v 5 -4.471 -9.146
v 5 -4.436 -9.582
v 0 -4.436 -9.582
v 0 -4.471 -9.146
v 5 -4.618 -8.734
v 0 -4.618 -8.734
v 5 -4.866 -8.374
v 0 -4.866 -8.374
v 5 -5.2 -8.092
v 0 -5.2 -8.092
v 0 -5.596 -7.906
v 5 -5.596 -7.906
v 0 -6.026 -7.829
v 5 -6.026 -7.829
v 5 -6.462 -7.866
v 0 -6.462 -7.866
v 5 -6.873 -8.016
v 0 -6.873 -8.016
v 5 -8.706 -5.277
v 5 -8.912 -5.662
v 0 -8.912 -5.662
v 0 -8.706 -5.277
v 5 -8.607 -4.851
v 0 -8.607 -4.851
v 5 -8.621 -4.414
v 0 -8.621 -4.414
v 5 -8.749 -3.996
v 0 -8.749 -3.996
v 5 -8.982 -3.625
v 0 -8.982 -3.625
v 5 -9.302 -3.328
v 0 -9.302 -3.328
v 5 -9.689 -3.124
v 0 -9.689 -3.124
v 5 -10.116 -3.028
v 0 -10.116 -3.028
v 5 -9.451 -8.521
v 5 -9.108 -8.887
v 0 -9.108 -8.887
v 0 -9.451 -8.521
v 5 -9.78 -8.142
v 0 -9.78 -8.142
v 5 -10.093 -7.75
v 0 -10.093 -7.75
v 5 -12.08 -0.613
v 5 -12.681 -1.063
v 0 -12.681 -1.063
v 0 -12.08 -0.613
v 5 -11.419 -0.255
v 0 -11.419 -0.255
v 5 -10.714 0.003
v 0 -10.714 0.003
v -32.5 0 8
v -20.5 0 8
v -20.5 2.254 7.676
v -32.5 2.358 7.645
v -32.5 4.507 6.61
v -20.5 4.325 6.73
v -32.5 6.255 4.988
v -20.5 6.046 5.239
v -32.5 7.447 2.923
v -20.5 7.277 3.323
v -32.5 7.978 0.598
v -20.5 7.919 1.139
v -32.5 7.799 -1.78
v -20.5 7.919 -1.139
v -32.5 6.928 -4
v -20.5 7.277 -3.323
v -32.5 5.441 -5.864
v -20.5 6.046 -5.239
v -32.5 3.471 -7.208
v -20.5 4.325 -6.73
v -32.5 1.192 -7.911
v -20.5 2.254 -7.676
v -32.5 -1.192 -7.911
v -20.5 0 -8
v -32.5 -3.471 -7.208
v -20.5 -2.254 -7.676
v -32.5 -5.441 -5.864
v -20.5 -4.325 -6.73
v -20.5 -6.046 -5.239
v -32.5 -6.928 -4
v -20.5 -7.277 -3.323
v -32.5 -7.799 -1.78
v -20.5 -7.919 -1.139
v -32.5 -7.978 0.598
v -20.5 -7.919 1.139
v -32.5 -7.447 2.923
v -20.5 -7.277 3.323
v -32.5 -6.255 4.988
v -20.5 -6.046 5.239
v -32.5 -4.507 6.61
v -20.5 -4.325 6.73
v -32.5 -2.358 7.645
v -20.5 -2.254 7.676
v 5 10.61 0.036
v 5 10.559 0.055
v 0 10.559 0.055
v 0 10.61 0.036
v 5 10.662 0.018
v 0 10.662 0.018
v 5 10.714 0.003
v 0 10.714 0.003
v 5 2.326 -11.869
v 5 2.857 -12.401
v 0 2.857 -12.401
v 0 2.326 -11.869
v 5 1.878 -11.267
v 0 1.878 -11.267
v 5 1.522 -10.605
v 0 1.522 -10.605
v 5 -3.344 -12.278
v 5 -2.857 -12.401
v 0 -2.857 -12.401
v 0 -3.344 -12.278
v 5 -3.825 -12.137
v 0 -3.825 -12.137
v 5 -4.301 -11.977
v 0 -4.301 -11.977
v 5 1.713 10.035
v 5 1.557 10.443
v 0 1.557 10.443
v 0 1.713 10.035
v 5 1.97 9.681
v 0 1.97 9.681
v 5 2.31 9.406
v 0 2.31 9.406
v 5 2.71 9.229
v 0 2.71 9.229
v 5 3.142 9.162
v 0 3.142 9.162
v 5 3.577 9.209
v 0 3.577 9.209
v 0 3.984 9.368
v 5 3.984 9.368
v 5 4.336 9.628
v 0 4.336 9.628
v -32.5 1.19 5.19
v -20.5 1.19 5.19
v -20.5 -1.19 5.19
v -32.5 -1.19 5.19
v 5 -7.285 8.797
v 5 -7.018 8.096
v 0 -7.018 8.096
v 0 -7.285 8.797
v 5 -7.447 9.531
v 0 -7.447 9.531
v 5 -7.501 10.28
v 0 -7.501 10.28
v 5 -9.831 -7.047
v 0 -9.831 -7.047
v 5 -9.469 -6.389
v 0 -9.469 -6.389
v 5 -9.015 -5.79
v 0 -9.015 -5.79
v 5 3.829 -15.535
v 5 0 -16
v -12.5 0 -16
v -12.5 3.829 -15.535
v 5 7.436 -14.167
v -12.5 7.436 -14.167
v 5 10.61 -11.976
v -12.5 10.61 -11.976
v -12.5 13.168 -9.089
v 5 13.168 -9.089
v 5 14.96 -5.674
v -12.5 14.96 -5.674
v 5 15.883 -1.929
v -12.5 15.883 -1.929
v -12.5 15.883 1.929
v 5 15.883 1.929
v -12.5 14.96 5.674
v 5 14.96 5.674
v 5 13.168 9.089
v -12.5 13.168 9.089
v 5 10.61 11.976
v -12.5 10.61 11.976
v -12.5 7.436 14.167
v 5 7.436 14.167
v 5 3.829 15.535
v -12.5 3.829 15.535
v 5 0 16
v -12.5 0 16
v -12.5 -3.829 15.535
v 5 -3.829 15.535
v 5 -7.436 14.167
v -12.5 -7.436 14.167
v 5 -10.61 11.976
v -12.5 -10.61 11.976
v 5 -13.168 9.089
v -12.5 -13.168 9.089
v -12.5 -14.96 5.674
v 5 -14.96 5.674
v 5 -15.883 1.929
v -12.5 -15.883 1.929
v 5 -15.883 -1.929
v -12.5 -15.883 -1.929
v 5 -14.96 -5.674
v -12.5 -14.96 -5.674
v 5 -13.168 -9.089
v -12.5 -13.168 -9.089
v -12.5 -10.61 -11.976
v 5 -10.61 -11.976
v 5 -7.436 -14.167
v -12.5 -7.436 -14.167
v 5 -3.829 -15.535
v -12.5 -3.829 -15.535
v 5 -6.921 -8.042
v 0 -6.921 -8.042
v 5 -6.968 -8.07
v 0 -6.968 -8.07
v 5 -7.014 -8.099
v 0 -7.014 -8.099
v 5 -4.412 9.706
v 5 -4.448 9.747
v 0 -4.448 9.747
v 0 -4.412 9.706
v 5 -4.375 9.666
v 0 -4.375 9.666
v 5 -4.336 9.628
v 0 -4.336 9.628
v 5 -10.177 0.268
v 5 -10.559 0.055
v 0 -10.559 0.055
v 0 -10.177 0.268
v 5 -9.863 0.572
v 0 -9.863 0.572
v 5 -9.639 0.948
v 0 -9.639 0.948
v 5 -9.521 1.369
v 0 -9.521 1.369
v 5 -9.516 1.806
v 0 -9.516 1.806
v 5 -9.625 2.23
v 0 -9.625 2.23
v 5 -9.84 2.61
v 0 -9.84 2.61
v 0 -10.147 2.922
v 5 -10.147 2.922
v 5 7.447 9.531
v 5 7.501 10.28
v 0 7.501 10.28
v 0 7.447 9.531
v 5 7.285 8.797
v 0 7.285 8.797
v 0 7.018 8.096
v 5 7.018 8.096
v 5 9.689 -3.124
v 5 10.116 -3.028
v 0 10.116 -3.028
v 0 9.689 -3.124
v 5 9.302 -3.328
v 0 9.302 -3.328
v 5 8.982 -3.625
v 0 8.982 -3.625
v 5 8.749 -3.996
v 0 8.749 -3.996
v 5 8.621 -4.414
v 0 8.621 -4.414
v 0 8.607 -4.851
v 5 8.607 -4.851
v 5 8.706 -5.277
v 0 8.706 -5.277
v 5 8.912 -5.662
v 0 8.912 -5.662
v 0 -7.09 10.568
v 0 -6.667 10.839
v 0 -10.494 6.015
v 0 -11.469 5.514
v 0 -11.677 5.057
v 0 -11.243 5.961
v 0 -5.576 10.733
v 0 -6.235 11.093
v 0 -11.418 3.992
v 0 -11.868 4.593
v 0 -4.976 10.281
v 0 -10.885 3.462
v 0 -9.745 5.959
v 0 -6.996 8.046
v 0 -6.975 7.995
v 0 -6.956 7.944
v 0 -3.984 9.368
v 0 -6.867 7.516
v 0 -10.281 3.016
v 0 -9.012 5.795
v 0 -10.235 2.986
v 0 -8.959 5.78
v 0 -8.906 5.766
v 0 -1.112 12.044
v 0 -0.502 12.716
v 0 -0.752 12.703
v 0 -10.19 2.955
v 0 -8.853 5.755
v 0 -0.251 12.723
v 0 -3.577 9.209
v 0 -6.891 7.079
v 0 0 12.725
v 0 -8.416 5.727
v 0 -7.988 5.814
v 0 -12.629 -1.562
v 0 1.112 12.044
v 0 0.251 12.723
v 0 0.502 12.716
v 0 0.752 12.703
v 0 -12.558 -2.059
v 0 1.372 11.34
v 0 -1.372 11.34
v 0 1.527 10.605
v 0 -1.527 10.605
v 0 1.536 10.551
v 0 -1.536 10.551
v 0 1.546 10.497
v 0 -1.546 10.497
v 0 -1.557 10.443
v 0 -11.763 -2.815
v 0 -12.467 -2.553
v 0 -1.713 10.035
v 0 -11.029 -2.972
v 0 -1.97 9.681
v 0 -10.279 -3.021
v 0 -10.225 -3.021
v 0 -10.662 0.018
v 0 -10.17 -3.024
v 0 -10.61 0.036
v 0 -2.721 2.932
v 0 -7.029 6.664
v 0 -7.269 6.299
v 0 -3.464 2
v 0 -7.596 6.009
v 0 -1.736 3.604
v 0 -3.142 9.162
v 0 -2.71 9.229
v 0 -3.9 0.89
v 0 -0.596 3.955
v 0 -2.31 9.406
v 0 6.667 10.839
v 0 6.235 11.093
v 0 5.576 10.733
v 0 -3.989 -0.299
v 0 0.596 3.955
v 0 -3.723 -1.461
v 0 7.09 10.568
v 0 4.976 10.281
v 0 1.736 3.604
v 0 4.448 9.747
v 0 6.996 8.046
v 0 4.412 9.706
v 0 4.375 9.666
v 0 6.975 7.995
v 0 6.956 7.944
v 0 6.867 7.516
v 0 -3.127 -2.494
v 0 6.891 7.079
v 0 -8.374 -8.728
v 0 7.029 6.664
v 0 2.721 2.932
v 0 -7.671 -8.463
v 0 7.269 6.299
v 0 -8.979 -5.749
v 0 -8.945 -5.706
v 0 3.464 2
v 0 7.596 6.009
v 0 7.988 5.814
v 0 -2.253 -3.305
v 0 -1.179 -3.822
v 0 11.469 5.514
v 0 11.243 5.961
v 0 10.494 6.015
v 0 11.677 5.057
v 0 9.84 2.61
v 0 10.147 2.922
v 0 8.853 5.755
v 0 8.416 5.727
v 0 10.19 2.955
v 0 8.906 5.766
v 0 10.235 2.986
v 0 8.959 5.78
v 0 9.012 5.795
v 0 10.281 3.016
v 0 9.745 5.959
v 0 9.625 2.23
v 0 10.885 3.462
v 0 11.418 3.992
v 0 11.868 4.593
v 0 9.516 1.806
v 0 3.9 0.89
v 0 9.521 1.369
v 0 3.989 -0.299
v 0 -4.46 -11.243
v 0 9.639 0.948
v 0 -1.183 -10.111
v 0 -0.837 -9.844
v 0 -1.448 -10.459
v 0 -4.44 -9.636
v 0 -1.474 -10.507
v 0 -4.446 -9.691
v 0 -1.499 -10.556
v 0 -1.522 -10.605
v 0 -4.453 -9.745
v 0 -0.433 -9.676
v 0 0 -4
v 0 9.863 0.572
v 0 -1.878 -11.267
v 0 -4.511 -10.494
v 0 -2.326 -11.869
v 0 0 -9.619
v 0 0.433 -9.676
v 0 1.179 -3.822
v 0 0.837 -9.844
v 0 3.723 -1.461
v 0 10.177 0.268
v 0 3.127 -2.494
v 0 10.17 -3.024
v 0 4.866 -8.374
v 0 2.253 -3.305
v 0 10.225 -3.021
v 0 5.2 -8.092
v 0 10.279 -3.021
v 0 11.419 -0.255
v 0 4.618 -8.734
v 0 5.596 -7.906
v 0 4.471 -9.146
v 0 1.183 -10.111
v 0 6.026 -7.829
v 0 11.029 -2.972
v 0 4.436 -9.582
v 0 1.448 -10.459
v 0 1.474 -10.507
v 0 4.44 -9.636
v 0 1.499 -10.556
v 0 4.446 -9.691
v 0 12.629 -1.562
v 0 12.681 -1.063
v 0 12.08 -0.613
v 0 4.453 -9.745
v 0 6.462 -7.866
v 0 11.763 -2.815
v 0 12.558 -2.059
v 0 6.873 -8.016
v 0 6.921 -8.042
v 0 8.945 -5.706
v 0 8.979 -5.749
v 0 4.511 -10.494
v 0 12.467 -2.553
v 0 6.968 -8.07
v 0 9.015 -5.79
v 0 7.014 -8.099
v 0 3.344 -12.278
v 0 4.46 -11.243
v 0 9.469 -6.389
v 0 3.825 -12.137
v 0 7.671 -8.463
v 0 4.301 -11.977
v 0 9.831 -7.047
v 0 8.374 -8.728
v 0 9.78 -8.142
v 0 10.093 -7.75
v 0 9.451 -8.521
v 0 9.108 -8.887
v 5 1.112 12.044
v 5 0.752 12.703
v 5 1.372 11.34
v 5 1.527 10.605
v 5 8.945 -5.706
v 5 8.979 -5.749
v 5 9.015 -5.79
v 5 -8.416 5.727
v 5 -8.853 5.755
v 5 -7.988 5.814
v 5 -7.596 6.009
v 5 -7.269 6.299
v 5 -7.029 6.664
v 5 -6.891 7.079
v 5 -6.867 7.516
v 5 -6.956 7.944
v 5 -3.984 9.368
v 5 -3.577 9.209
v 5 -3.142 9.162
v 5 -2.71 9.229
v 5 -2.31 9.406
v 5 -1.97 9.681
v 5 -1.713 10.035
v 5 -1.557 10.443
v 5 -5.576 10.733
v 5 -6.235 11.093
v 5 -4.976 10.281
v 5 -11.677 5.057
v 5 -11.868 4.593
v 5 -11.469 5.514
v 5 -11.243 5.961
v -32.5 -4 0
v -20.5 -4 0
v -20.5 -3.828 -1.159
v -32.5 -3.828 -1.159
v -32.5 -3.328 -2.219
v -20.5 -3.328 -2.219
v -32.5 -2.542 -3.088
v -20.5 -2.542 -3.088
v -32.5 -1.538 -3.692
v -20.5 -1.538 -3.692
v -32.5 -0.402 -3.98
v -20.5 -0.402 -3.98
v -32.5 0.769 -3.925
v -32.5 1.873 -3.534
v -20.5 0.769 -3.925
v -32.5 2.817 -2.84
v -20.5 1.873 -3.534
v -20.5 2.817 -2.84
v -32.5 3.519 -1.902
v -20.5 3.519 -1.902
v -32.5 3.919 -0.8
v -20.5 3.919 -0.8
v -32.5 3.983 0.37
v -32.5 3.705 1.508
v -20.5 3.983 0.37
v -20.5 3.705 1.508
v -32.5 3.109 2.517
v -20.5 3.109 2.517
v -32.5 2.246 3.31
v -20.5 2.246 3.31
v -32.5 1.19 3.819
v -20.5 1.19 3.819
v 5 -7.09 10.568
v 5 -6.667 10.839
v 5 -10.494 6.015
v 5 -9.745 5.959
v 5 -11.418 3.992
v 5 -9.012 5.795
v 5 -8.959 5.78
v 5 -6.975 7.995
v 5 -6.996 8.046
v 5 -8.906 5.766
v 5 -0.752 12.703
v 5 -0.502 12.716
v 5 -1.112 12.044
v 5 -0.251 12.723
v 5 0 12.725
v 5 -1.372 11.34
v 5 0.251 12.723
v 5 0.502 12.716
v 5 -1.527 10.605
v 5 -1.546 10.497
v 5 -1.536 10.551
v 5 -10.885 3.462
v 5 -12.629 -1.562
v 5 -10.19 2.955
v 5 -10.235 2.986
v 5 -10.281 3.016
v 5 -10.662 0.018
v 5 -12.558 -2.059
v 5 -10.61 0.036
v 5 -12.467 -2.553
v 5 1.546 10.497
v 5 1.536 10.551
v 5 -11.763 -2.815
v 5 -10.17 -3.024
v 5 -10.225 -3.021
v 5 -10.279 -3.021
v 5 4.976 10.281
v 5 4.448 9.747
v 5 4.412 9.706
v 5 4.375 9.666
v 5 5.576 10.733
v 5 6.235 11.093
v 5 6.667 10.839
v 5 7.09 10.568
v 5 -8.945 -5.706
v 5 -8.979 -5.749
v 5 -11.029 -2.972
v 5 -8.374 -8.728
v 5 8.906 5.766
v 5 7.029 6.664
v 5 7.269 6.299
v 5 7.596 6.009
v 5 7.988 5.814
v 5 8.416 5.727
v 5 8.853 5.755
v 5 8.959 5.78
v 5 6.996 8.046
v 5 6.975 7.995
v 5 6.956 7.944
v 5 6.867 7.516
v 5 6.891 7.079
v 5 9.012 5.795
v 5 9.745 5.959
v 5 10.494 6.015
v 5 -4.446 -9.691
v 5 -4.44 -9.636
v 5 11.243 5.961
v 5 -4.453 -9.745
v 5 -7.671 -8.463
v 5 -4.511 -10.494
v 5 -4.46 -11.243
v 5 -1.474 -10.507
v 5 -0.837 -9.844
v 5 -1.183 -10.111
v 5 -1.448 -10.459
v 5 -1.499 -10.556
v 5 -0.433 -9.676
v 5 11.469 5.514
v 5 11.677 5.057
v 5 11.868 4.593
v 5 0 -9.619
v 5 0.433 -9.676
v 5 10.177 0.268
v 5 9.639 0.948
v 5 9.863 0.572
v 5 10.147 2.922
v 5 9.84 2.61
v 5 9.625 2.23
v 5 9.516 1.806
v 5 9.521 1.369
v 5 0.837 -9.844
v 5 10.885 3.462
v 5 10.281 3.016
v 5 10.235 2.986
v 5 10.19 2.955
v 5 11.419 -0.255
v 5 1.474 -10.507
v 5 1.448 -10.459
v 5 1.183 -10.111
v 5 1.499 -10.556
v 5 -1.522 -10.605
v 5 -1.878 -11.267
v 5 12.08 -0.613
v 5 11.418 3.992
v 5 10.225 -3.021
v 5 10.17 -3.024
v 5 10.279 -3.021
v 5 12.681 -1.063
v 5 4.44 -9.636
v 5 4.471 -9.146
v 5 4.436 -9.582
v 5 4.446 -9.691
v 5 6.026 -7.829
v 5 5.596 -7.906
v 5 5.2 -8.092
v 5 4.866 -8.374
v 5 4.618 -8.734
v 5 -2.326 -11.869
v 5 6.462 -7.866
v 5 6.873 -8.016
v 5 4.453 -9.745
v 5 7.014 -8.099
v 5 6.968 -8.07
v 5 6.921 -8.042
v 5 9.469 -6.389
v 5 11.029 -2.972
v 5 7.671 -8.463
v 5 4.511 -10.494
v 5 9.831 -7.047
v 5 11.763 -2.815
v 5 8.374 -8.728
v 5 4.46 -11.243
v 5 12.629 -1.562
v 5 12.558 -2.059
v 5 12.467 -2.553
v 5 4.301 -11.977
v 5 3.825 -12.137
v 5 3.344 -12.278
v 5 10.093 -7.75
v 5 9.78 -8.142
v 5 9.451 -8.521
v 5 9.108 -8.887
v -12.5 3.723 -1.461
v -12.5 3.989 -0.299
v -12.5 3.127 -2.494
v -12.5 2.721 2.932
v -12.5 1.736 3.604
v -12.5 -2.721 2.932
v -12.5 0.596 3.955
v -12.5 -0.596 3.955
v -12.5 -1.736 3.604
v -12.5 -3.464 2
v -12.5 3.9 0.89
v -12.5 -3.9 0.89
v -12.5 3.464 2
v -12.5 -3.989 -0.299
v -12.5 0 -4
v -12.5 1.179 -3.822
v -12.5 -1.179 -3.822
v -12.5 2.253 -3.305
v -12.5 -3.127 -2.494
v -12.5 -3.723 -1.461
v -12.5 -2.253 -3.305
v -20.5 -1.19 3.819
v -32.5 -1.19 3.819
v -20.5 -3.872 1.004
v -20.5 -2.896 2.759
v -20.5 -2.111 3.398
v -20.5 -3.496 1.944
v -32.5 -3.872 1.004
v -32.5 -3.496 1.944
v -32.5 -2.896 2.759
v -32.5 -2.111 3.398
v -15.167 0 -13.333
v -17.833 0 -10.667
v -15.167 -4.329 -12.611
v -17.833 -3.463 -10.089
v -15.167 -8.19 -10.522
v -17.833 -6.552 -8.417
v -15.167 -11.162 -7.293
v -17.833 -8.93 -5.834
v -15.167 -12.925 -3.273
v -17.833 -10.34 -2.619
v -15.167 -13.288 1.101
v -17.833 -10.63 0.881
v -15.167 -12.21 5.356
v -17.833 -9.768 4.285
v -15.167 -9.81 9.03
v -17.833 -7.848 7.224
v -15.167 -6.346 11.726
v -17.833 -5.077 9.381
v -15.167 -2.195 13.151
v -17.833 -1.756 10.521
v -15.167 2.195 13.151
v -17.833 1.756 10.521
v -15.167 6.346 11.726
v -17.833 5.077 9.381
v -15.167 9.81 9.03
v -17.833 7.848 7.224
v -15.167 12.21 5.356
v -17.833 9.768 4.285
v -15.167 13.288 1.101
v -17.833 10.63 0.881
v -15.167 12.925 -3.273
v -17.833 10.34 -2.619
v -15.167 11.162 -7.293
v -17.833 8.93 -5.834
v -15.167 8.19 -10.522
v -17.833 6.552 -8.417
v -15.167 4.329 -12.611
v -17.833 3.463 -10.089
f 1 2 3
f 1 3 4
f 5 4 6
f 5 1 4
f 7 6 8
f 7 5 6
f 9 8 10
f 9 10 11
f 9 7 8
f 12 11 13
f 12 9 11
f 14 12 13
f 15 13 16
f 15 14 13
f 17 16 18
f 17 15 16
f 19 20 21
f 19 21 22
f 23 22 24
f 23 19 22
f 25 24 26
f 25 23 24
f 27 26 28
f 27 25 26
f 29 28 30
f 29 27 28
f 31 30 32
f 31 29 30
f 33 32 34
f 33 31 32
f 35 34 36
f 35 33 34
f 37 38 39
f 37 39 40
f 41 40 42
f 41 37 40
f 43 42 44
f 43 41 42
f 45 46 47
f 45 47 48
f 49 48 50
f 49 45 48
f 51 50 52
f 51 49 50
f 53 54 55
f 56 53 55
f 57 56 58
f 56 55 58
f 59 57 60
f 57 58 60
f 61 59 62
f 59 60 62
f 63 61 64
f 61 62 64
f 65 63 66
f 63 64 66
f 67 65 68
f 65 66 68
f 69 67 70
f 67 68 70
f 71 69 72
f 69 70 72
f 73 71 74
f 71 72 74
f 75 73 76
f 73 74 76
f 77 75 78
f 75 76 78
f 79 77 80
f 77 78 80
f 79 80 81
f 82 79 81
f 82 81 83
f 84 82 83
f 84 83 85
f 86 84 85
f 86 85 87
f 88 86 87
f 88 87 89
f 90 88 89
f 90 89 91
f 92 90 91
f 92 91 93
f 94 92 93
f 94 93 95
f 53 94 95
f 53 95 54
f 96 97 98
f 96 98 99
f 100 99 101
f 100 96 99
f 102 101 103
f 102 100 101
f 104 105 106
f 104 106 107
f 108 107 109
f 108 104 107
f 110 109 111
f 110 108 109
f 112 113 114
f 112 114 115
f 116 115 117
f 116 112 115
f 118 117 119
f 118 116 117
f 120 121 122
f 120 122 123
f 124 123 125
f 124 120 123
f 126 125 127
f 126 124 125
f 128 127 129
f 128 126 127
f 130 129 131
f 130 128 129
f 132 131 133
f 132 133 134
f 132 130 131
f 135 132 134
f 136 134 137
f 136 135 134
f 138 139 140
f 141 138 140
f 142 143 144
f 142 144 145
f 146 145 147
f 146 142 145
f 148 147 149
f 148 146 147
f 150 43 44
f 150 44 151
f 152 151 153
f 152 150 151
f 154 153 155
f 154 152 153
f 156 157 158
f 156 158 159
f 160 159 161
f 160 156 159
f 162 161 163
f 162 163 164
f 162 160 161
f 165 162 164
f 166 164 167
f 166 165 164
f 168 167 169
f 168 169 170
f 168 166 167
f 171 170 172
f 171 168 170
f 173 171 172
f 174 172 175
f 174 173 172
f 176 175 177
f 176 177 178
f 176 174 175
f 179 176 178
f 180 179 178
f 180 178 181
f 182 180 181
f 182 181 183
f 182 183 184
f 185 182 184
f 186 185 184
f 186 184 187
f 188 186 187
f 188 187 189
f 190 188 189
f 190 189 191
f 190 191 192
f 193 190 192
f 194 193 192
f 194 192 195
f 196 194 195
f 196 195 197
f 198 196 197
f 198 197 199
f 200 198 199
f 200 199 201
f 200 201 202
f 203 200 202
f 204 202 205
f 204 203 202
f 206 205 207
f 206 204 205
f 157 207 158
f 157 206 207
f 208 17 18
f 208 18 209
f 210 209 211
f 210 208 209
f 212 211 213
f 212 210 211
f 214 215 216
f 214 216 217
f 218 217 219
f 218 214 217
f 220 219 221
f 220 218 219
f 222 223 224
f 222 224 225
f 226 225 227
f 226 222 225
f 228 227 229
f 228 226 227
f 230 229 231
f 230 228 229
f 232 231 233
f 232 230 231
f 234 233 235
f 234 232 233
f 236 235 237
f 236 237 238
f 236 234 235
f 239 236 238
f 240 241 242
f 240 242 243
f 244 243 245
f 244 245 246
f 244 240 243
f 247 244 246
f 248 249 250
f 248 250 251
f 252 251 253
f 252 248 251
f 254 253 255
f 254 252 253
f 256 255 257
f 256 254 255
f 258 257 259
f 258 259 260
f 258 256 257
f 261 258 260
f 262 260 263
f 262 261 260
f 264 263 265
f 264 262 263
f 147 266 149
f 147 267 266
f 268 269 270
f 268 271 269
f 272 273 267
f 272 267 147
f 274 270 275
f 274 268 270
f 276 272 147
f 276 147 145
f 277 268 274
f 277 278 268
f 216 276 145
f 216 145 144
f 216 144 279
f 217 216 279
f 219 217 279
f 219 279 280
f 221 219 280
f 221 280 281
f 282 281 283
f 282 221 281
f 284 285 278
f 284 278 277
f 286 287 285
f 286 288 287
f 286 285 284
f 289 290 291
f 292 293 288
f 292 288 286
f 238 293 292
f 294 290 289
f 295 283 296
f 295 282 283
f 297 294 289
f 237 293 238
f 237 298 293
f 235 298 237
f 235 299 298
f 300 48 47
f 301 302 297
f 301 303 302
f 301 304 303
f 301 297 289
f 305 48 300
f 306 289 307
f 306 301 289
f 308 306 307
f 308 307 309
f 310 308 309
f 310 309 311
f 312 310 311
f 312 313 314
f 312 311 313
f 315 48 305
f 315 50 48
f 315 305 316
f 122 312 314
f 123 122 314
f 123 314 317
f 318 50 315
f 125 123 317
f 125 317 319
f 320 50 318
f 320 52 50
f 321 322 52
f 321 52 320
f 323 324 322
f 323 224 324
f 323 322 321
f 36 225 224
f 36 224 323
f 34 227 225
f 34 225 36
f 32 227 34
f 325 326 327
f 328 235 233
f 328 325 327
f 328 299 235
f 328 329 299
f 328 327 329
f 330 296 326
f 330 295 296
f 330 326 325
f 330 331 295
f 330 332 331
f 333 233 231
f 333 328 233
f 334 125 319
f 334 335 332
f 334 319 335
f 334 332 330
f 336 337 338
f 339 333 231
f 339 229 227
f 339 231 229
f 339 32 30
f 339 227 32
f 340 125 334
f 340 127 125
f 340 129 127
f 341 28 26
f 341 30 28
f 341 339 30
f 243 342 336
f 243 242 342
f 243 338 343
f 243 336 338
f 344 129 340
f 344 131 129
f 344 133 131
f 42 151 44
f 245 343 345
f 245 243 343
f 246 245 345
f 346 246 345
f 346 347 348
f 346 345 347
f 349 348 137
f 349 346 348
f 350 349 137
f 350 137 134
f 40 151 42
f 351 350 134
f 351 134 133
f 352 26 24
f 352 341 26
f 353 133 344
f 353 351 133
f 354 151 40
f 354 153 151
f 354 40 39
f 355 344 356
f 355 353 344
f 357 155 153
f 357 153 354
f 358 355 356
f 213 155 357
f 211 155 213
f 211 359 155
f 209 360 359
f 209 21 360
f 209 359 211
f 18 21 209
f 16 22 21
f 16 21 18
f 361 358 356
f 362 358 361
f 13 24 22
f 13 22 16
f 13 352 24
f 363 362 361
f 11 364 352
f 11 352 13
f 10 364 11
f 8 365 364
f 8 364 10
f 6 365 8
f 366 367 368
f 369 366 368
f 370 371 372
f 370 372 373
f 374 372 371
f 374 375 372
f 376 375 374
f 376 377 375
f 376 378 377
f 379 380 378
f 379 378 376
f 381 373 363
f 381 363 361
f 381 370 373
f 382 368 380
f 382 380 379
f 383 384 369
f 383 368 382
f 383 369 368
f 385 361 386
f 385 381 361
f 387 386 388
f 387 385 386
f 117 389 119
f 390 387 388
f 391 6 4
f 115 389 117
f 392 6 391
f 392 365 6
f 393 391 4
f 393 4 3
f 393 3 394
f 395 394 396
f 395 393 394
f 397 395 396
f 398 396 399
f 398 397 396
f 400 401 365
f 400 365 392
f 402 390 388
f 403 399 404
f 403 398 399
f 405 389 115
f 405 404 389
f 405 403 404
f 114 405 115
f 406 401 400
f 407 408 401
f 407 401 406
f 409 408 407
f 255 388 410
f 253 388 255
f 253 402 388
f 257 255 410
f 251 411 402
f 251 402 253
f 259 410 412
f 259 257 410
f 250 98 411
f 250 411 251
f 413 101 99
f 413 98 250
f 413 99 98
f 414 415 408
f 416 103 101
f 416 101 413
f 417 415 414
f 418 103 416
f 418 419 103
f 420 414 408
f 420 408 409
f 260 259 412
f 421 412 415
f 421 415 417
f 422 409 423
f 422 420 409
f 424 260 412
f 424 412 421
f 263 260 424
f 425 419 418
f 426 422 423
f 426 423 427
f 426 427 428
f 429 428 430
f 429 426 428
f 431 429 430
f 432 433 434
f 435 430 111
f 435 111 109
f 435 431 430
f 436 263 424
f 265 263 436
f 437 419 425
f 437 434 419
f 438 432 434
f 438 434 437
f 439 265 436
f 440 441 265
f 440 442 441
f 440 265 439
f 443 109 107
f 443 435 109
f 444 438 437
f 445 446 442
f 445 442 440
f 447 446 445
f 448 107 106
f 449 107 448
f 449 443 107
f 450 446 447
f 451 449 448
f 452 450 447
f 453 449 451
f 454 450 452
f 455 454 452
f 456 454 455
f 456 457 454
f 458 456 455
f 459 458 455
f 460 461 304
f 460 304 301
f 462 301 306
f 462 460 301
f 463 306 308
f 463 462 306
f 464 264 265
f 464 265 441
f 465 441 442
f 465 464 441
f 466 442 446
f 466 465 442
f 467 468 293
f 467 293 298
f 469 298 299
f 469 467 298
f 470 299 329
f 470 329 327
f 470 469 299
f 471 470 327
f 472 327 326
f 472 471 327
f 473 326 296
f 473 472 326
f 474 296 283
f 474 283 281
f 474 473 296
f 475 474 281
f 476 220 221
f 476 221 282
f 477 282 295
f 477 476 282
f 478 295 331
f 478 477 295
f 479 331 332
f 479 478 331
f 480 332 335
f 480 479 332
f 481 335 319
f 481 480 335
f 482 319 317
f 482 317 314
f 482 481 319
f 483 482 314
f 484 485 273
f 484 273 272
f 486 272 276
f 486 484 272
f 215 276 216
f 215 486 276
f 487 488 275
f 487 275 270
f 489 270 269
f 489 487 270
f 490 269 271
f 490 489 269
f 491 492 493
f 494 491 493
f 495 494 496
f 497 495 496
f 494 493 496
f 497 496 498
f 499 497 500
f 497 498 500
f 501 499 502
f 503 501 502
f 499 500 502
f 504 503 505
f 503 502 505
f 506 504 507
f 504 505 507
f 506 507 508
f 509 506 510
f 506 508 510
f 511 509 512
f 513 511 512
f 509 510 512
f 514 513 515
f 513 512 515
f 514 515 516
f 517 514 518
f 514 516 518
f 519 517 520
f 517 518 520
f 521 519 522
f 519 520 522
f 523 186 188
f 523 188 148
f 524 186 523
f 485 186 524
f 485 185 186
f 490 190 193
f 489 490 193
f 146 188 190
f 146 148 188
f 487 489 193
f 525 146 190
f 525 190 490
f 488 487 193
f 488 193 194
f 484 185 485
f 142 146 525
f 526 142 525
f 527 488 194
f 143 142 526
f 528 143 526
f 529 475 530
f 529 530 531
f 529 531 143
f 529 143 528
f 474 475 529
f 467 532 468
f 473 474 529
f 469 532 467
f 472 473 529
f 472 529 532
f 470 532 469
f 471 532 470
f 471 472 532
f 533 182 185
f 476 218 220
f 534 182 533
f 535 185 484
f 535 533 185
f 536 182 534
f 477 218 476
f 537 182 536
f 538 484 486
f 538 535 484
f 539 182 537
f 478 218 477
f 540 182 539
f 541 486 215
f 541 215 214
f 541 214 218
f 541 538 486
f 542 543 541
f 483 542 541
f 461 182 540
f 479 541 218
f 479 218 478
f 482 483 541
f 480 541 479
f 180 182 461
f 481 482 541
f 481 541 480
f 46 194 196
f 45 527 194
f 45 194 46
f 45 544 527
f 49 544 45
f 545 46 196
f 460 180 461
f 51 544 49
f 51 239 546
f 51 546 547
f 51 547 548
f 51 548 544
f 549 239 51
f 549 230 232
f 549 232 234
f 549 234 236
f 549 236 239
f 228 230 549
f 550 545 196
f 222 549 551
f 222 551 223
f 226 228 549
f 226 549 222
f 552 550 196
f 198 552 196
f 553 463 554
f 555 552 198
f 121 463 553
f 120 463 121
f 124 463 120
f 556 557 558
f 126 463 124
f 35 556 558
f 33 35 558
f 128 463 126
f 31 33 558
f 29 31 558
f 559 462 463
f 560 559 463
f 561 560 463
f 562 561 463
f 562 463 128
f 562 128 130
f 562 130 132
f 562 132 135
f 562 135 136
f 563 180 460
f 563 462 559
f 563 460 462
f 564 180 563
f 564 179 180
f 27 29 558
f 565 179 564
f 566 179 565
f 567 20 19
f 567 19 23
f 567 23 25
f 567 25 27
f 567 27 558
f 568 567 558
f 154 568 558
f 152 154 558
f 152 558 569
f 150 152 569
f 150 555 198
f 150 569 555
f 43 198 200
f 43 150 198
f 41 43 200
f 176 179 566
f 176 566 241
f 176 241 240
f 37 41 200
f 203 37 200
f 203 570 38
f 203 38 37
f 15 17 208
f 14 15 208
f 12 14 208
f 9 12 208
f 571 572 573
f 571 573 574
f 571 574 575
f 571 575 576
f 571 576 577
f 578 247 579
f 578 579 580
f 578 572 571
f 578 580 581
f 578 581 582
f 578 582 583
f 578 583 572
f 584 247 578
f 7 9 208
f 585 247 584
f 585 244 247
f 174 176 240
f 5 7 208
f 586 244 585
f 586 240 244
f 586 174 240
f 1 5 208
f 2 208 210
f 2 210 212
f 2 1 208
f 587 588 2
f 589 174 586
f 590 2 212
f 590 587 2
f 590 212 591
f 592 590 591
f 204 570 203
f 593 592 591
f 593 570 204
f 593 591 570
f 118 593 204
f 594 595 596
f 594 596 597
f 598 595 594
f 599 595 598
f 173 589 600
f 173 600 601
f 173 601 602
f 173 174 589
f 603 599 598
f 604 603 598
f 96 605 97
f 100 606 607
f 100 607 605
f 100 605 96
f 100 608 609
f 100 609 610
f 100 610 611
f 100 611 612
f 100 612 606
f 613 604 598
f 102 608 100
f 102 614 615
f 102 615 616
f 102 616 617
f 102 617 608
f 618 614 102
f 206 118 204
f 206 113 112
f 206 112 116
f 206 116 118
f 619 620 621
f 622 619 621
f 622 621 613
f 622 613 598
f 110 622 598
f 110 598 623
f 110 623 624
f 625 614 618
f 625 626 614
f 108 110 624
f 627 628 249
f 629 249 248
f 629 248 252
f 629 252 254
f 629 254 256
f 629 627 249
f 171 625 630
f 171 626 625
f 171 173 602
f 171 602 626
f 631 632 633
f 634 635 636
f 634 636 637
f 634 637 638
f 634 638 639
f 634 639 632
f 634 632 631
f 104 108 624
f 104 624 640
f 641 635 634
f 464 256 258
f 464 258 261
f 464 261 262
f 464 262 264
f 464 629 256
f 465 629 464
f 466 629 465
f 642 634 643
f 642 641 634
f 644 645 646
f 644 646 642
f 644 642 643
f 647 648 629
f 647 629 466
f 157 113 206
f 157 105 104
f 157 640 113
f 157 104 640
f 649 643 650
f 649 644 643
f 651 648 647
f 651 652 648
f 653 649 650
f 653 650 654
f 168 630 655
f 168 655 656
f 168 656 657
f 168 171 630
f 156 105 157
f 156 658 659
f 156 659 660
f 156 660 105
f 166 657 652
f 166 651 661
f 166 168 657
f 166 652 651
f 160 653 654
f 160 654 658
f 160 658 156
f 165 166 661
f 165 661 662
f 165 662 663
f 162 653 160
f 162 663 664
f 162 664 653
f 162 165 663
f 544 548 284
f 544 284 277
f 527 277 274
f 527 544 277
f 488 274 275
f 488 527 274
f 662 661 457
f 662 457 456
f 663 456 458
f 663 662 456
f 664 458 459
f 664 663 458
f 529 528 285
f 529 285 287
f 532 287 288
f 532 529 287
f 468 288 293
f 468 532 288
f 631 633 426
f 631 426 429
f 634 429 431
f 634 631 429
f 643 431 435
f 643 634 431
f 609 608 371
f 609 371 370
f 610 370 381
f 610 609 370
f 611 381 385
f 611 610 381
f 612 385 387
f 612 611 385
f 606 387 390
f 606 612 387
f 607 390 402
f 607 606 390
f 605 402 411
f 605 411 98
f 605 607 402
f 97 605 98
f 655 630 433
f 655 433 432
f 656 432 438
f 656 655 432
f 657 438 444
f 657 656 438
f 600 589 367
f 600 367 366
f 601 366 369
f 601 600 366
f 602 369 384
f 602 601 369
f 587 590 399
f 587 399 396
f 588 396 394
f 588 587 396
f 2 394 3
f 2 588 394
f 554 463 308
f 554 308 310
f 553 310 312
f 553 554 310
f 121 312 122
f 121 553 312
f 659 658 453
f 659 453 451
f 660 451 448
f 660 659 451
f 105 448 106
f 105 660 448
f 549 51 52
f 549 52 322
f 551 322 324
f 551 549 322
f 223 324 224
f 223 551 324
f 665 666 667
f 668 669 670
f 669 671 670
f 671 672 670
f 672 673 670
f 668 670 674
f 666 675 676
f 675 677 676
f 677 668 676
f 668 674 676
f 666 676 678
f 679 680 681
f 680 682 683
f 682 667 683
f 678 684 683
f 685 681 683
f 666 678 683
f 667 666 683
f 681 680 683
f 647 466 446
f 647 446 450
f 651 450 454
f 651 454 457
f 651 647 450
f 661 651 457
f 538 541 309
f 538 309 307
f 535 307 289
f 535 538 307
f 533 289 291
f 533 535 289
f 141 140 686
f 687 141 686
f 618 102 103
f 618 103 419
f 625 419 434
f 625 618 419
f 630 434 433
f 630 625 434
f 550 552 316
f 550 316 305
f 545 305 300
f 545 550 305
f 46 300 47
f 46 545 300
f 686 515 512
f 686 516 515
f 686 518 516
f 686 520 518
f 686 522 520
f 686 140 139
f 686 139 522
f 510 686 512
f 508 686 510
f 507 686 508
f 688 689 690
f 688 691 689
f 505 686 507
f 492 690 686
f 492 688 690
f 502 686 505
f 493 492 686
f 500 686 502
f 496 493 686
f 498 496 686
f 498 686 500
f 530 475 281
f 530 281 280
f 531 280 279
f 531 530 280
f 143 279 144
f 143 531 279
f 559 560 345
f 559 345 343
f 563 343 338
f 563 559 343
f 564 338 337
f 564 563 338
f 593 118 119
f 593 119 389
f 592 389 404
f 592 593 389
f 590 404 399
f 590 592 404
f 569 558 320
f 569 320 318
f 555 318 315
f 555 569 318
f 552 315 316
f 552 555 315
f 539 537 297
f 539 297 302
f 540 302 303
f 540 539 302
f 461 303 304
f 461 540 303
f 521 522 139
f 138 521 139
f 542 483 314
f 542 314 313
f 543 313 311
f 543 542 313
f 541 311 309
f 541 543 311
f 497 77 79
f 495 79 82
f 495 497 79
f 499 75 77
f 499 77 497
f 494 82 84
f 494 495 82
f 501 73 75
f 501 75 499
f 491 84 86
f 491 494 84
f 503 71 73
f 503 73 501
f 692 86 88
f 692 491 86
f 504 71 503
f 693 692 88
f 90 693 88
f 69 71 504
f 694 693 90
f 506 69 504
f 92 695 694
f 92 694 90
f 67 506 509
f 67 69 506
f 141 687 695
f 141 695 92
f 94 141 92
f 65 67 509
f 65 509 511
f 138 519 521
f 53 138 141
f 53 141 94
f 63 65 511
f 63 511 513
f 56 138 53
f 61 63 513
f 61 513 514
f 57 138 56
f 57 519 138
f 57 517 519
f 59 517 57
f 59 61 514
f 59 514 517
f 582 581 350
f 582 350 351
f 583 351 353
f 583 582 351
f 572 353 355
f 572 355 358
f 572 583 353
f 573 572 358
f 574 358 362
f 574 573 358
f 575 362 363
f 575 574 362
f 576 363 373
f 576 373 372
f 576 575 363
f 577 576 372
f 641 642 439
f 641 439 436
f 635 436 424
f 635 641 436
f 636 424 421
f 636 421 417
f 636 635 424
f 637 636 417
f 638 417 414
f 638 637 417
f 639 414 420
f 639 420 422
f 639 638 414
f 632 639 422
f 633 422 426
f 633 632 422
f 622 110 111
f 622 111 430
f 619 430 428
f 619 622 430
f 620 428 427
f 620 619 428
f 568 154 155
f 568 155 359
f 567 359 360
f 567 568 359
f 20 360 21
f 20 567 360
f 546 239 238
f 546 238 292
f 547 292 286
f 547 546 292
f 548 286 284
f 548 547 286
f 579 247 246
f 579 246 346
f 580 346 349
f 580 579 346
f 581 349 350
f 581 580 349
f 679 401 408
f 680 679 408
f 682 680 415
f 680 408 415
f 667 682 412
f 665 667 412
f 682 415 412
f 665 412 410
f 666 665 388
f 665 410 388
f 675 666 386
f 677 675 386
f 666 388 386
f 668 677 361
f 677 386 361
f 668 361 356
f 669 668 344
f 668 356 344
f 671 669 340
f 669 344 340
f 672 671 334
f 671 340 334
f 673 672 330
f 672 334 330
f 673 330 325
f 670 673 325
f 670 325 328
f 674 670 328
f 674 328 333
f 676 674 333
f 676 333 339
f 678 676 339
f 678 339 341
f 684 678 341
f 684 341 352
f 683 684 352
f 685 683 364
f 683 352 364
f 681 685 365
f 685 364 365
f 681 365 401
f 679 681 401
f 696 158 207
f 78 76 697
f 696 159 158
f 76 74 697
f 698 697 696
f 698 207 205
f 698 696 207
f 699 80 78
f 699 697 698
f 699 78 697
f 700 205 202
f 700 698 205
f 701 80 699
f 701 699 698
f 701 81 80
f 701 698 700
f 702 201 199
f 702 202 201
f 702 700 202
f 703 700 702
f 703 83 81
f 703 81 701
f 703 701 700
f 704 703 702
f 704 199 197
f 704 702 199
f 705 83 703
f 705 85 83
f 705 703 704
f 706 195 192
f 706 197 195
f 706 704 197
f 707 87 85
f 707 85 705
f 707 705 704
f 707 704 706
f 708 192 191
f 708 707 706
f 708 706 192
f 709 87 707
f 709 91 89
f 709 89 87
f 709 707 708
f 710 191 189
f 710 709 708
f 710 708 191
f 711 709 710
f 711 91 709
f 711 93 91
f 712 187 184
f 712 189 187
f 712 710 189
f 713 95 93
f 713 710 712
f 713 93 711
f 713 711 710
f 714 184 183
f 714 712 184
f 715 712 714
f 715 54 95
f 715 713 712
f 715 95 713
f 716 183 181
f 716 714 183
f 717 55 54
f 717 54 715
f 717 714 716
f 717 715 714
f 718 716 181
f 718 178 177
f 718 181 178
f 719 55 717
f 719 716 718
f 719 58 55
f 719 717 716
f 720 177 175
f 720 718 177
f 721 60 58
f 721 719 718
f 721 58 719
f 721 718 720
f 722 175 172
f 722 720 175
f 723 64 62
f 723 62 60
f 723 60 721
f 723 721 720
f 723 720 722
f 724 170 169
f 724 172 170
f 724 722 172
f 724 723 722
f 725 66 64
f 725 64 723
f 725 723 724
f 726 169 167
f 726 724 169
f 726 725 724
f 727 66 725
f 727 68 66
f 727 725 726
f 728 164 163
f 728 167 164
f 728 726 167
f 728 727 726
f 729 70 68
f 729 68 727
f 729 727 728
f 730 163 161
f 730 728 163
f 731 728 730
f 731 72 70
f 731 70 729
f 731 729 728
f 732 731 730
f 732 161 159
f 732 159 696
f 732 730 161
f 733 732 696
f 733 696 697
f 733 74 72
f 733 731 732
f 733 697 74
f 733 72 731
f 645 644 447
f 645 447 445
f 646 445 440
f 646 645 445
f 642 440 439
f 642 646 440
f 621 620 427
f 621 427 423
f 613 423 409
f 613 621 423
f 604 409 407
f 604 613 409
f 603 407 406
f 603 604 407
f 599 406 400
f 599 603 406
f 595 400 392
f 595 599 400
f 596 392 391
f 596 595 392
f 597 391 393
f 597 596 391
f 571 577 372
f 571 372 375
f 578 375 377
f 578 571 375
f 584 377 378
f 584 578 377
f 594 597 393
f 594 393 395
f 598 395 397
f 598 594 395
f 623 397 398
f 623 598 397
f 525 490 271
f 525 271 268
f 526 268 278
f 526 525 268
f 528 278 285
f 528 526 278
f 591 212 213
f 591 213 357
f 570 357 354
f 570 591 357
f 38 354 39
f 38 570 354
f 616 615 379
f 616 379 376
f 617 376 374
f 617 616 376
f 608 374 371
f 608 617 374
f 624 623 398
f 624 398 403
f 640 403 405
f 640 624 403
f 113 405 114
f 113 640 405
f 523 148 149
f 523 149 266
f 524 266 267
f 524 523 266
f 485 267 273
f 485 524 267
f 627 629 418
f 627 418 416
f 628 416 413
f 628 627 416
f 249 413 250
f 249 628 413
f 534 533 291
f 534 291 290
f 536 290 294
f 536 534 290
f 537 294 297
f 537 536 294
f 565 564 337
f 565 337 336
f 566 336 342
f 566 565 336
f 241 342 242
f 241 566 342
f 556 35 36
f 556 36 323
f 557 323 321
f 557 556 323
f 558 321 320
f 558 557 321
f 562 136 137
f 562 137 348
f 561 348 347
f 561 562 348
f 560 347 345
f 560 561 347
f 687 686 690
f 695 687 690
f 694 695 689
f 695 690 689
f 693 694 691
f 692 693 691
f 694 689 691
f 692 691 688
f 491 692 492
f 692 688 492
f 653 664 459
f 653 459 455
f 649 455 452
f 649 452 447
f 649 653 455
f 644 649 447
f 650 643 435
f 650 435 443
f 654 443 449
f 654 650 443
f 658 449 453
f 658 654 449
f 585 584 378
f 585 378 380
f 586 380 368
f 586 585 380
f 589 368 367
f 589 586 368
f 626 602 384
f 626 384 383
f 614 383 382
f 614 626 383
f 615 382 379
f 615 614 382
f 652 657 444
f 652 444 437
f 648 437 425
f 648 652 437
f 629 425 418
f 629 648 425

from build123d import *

# Parameters (mm, degrees)
SKETCH1_R           = 16
SKETCH1_R_2         = 4
BOSS_EXTRUDE1_DEPTH = 12.5
BOSS_EXTRUDE2_START = 5
SKETCH1_3_R         = 16
BOSS_EXTRUDE2_DEPTH = 5
SKETCH2_R           = 16
BOSS_EXTRUDE3_DEPTH = 8
BOSS_EXTRUDE3_TAPER = 45
SKETCH4_R           = 8
BOSS_EXTRUDE4_DEPTH = 12


with BuildPart() as part:
    # Sketch1 → Boss-Extrude1 (new body)
    with BuildSketch(Plane.YZ):
        Circle(SKETCH1_R)
        Circle(SKETCH1_R_2, mode=Mode.SUBTRACT)
    extrude(amount=-BOSS_EXTRUDE1_DEPTH)

    # Sketch1<3> → Boss-Extrude2 (add)
    with BuildSketch(Plane.YZ.offset(BOSS_EXTRUDE2_START)):
        Circle(SKETCH1_3_R)
        with BuildLine():
            ThreePointArc((-4.453103796, -9.74483847), (-4.442785625, -9.66347175), (-4.436480838, -9.581696098))
            ThreePointArc((-4.436480838, -9.581696098), (-5.200182393, -8.091641748), (-6.872836595, -8.015945326))
            ThreePointArc((-6.872836595, -8.015945326), (-6.944603241, -8.055651196), (-7.014330689, -8.098837891))
            ThreePointArc((-7.014330689, -8.098837891), (-8.017688064, -8.608122706), (-9.107689918, -8.887394979))
            ThreePointArc((-9.107689918, -8.887394979), (-9.617215633, -8.333364784), (-10.093093531, -7.750178588))
            ThreePointArc((-10.093093531, -7.750178588), (-9.661540409, -6.711015969), (-9.014646736, -5.790350112))
            ThreePointArc((-9.014646736, -5.790350112), (-8.961976369, -5.727478496), (-8.912461189, -5.662093066))
            ThreePointArc((-8.912461189, -5.662093066), (-8.749343619, -3.995691347), (-10.1155453, -3.027706329))
            ThreePointArc((-10.1155453, -3.027706329), (-10.197385858, -3.022309054), (-10.27939281, -3.02094251))
            ThreePointArc((-10.27939281, -3.02094251), (-11.398810905, -2.906924208), (-12.466764806, -2.552563501))
            ThreePointArc((-12.466764806, -2.552563501), (-12.595873777, -1.811013243), (-12.680913477, -1.06312678))
            ThreePointArc((-12.680913477, -1.06312678), (-11.756054161, -0.422242789), (-10.714103032, 0.002533493))
            ThreePointArc((-10.714103032, 0.002533493), (-10.635802938, 0.026948711), (-10.558798085, 0.055184508))
            ThreePointArc((-10.558798085, 0.055184508), (-9.520650065, 1.368862824), (-10.146639845, 2.921808034))
            ThreePointArc((-10.146639845, 2.921808034), (-10.212570517, 2.970594857), (-10.280820345, 3.016080773))
            ThreePointArc((-10.280820345, 3.016080773), (-11.160891825, 3.717202186), (-11.867729954, 4.592688853))
            ThreePointArc((-11.867729954, 4.592688853), (-11.575430994, 5.286322206), (-11.242632993, 5.961460269))
            ThreePointArc((-11.242632993, 5.961460269), (-10.118103781, 6.000589494), (-9.011907317, 5.794612731))
            ThreePointArc((-9.011907317, 5.794612731), (-8.932837223, 5.772819893), (-8.852791194, 5.75494139))
            ThreePointArc((-8.852791194, 5.75494139), (-7.269217386, 6.298812721), (-6.956247932, 7.943668991))
            ThreePointArc((-6.956247932, 7.943668991), (-6.985336195, 8.020355891), (-7.018160061, 8.095519721))
            ThreePointArc((-7.018160061, 8.095519721), (-7.379468448, 9.161143151), (-7.500774695, 10.279794946))
            ThreePointArc((-7.500774695, 10.279794946), (-6.879870658, 10.705287707), (-6.234895971, 11.093325804))
            ThreePointArc((-6.234895971, 11.093325804), (-5.267726942, 10.518277011), (-4.448494704, 9.74694337))
            ThreePointArc((-4.448494704, 9.74694337), (-4.393758806, 9.685861548), (-4.33608565, 9.627545044))
            ThreePointArc((-4.33608565, 9.627545044), (-2.709859549, 9.228934084), (-1.557296451, 10.443471171))
            ThreePointArc((-1.557296451, 10.443471171), (-1.540306987, 10.523710598), (-1.527283546, 10.604688358))
            ThreePointArc((-1.527283546, 10.604688358), (-1.255115981, 11.696485895), (-0.752376468, 12.703138778))
            ThreePointArc((-0.752376468, 12.703138778), (-0.376352864, 12.719833477), (0, 12.7254))
            ThreePointArc((0, 12.7254), (0.376352864, 12.719833477), (0.752376468, 12.703138778))
            ThreePointArc((0.752376468, 12.703138778), (1.255115981, 11.696485895), (1.527283546, 10.604688358))
            ThreePointArc((1.527283546, 10.604688358), (1.540306987, 10.523710598), (1.557296451, 10.443471171))
            ThreePointArc((1.557296451, 10.443471171), (2.709859549, 9.228934084), (4.33608565, 9.627545044))
            ThreePointArc((4.33608565, 9.627545044), (4.393758806, 9.685861548), (4.448494704, 9.74694337))
            ThreePointArc((4.448494704, 9.74694337), (5.267726942, 10.518277011), (6.234895971, 11.093325804))
            ThreePointArc((6.234895971, 11.093325804), (6.879870658, 10.705287707), (7.500774695, 10.279794946))
            ThreePointArc((7.500774695, 10.279794946), (7.379468448, 9.161143151), (7.018160061, 8.095519721))
            ThreePointArc((7.018160061, 8.095519721), (6.985336195, 8.020355891), (6.956247932, 7.943668991))
            ThreePointArc((6.956247932, 7.943668991), (7.269217386, 6.298812721), (8.852791194, 5.75494139))
            ThreePointArc((8.852791194, 5.75494139), (8.932837223, 5.772819893), (9.011907317, 5.794612731))
            ThreePointArc((9.011907317, 5.794612731), (10.118103781, 6.000589494), (11.242632993, 5.961460269))
            ThreePointArc((11.242632993, 5.961460269), (11.575430994, 5.286322206), (11.867729954, 4.592688853))
            ThreePointArc((11.867729954, 4.592688853), (11.160891825, 3.717202186), (10.280820345, 3.016080773))
            ThreePointArc((10.280820345, 3.016080773), (10.212570517, 2.970594857), (10.146639845, 2.921808034))
            ThreePointArc((10.146639845, 2.921808034), (9.520650065, 1.368862824), (10.558798085, 0.055184508))
            ThreePointArc((10.558798085, 0.055184508), (10.635802938, 0.026948711), (10.714103032, 0.002533493))
            ThreePointArc((10.714103032, 0.002533493), (11.756054161, -0.422242789), (12.680913477, -1.06312678))
            ThreePointArc((12.680913477, -1.06312678), (12.595873777, -1.811013243), (12.466764806, -2.552563501))
            ThreePointArc((12.466764806, -2.552563501), (11.398810905, -2.906924208), (10.27939281, -3.02094251))
            ThreePointArc((10.27939281, -3.02094251), (10.197385858, -3.022309054), (10.1155453, -3.027706329))
            ThreePointArc((10.1155453, -3.027706329), (8.749343619, -3.995691347), (8.912461189, -5.662093066))
            ThreePointArc((8.912461189, -5.662093066), (8.961976369, -5.727478496), (9.014646736, -5.790350112))
            ThreePointArc((9.014646736, -5.790350112), (9.661540409, -6.711015969), (10.093093531, -7.750178588))
            ThreePointArc((10.093093531, -7.750178588), (9.617215633, -8.333364784), (9.107689918, -8.887394979))
            ThreePointArc((9.107689918, -8.887394979), (8.01768807, -8.608122703), (7.014330701, -8.098837886))
            ThreePointArc((7.014330701, -8.098837886), (6.944603253, -8.055651191), (6.872836606, -8.015945321))
            ThreePointArc((6.872836606, -8.015945321), (5.200182396, -8.091641744), (4.436480837, -9.5816961))
            ThreePointArc((4.436480837, -9.5816961), (4.442785625, -9.663471753), (4.453103796, -9.744838473))
            ThreePointArc((4.453103796, -9.744838473), (4.499555842, -10.869089), (4.300787703, -11.976603454))
            ThreePointArc((4.300787703, -11.976603454), (3.585159479, -12.209931886), (2.856987833, -12.400541346))
            ThreePointArc((2.856987833, -12.400541346), (2.091005912, -11.576303066), (1.522268135, -10.605409465))
            ThreePointArc((1.522268135, -10.605409465), (1.486958164, -10.531381002), (1.448050834, -10.459178321))
            ThreePointArc((1.448050834, -10.459178321), (1e-09, -9.618553067), (-1.448050833, -10.459178319))
            ThreePointArc((-1.448050833, -10.459178319), (-1.486958163, -10.531381001), (-1.522268135, -10.605409465))
            ThreePointArc((-1.522268135, -10.605409465), (-2.091005912, -11.576303066), (-2.856987833, -12.400541346))
            ThreePointArc((-2.856987833, -12.400541346), (-3.585159479, -12.209931886), (-4.300787703, -11.976603454))
            ThreePointArc((-4.300787703, -11.976603454), (-4.499555842, -10.869088998), (-4.453103796, -9.74483847))
        make_face(mode=Mode.SUBTRACT)
    extrude(amount=-BOSS_EXTRUDE2_DEPTH)

    # Sketch2 → Boss-Extrude3 (add)
    with BuildSketch(Plane(origin=(-12.5, 0, 0), x_dir=(0, -1, 0), z_dir=(-1, 0, 0))):
        Circle(SKETCH2_R)
    extrude(amount=BOSS_EXTRUDE3_DEPTH, taper=BOSS_EXTRUDE3_TAPER)

    # Sketch4 → Boss-Extrude4 (add)
    with BuildSketch(Plane(origin=(-20.5, 0, 0), x_dir=(0, -1, 0), z_dir=(-1, 0, 0))):
        Circle(SKETCH4_R)
        with BuildLine():
            Line((-1.19, 3.818887272), (-1.19, 5.19))
            Line((-1.19, 5.19), (1.19, 5.19))
            Line((1.19, 5.19), (1.19, 3.818887272))
            ThreePointArc((1.19, 3.818887272), (3.221800739, 2.370653918), (4, 0))
            ThreePointArc((4, 0), (-2.370653918, -3.221800739), (-1.19, 3.818887272))
        make_face(mode=Mode.SUBTRACT)
    extrude(amount=BOSS_EXTRUDE4_DEPTH)


solid = part.part
